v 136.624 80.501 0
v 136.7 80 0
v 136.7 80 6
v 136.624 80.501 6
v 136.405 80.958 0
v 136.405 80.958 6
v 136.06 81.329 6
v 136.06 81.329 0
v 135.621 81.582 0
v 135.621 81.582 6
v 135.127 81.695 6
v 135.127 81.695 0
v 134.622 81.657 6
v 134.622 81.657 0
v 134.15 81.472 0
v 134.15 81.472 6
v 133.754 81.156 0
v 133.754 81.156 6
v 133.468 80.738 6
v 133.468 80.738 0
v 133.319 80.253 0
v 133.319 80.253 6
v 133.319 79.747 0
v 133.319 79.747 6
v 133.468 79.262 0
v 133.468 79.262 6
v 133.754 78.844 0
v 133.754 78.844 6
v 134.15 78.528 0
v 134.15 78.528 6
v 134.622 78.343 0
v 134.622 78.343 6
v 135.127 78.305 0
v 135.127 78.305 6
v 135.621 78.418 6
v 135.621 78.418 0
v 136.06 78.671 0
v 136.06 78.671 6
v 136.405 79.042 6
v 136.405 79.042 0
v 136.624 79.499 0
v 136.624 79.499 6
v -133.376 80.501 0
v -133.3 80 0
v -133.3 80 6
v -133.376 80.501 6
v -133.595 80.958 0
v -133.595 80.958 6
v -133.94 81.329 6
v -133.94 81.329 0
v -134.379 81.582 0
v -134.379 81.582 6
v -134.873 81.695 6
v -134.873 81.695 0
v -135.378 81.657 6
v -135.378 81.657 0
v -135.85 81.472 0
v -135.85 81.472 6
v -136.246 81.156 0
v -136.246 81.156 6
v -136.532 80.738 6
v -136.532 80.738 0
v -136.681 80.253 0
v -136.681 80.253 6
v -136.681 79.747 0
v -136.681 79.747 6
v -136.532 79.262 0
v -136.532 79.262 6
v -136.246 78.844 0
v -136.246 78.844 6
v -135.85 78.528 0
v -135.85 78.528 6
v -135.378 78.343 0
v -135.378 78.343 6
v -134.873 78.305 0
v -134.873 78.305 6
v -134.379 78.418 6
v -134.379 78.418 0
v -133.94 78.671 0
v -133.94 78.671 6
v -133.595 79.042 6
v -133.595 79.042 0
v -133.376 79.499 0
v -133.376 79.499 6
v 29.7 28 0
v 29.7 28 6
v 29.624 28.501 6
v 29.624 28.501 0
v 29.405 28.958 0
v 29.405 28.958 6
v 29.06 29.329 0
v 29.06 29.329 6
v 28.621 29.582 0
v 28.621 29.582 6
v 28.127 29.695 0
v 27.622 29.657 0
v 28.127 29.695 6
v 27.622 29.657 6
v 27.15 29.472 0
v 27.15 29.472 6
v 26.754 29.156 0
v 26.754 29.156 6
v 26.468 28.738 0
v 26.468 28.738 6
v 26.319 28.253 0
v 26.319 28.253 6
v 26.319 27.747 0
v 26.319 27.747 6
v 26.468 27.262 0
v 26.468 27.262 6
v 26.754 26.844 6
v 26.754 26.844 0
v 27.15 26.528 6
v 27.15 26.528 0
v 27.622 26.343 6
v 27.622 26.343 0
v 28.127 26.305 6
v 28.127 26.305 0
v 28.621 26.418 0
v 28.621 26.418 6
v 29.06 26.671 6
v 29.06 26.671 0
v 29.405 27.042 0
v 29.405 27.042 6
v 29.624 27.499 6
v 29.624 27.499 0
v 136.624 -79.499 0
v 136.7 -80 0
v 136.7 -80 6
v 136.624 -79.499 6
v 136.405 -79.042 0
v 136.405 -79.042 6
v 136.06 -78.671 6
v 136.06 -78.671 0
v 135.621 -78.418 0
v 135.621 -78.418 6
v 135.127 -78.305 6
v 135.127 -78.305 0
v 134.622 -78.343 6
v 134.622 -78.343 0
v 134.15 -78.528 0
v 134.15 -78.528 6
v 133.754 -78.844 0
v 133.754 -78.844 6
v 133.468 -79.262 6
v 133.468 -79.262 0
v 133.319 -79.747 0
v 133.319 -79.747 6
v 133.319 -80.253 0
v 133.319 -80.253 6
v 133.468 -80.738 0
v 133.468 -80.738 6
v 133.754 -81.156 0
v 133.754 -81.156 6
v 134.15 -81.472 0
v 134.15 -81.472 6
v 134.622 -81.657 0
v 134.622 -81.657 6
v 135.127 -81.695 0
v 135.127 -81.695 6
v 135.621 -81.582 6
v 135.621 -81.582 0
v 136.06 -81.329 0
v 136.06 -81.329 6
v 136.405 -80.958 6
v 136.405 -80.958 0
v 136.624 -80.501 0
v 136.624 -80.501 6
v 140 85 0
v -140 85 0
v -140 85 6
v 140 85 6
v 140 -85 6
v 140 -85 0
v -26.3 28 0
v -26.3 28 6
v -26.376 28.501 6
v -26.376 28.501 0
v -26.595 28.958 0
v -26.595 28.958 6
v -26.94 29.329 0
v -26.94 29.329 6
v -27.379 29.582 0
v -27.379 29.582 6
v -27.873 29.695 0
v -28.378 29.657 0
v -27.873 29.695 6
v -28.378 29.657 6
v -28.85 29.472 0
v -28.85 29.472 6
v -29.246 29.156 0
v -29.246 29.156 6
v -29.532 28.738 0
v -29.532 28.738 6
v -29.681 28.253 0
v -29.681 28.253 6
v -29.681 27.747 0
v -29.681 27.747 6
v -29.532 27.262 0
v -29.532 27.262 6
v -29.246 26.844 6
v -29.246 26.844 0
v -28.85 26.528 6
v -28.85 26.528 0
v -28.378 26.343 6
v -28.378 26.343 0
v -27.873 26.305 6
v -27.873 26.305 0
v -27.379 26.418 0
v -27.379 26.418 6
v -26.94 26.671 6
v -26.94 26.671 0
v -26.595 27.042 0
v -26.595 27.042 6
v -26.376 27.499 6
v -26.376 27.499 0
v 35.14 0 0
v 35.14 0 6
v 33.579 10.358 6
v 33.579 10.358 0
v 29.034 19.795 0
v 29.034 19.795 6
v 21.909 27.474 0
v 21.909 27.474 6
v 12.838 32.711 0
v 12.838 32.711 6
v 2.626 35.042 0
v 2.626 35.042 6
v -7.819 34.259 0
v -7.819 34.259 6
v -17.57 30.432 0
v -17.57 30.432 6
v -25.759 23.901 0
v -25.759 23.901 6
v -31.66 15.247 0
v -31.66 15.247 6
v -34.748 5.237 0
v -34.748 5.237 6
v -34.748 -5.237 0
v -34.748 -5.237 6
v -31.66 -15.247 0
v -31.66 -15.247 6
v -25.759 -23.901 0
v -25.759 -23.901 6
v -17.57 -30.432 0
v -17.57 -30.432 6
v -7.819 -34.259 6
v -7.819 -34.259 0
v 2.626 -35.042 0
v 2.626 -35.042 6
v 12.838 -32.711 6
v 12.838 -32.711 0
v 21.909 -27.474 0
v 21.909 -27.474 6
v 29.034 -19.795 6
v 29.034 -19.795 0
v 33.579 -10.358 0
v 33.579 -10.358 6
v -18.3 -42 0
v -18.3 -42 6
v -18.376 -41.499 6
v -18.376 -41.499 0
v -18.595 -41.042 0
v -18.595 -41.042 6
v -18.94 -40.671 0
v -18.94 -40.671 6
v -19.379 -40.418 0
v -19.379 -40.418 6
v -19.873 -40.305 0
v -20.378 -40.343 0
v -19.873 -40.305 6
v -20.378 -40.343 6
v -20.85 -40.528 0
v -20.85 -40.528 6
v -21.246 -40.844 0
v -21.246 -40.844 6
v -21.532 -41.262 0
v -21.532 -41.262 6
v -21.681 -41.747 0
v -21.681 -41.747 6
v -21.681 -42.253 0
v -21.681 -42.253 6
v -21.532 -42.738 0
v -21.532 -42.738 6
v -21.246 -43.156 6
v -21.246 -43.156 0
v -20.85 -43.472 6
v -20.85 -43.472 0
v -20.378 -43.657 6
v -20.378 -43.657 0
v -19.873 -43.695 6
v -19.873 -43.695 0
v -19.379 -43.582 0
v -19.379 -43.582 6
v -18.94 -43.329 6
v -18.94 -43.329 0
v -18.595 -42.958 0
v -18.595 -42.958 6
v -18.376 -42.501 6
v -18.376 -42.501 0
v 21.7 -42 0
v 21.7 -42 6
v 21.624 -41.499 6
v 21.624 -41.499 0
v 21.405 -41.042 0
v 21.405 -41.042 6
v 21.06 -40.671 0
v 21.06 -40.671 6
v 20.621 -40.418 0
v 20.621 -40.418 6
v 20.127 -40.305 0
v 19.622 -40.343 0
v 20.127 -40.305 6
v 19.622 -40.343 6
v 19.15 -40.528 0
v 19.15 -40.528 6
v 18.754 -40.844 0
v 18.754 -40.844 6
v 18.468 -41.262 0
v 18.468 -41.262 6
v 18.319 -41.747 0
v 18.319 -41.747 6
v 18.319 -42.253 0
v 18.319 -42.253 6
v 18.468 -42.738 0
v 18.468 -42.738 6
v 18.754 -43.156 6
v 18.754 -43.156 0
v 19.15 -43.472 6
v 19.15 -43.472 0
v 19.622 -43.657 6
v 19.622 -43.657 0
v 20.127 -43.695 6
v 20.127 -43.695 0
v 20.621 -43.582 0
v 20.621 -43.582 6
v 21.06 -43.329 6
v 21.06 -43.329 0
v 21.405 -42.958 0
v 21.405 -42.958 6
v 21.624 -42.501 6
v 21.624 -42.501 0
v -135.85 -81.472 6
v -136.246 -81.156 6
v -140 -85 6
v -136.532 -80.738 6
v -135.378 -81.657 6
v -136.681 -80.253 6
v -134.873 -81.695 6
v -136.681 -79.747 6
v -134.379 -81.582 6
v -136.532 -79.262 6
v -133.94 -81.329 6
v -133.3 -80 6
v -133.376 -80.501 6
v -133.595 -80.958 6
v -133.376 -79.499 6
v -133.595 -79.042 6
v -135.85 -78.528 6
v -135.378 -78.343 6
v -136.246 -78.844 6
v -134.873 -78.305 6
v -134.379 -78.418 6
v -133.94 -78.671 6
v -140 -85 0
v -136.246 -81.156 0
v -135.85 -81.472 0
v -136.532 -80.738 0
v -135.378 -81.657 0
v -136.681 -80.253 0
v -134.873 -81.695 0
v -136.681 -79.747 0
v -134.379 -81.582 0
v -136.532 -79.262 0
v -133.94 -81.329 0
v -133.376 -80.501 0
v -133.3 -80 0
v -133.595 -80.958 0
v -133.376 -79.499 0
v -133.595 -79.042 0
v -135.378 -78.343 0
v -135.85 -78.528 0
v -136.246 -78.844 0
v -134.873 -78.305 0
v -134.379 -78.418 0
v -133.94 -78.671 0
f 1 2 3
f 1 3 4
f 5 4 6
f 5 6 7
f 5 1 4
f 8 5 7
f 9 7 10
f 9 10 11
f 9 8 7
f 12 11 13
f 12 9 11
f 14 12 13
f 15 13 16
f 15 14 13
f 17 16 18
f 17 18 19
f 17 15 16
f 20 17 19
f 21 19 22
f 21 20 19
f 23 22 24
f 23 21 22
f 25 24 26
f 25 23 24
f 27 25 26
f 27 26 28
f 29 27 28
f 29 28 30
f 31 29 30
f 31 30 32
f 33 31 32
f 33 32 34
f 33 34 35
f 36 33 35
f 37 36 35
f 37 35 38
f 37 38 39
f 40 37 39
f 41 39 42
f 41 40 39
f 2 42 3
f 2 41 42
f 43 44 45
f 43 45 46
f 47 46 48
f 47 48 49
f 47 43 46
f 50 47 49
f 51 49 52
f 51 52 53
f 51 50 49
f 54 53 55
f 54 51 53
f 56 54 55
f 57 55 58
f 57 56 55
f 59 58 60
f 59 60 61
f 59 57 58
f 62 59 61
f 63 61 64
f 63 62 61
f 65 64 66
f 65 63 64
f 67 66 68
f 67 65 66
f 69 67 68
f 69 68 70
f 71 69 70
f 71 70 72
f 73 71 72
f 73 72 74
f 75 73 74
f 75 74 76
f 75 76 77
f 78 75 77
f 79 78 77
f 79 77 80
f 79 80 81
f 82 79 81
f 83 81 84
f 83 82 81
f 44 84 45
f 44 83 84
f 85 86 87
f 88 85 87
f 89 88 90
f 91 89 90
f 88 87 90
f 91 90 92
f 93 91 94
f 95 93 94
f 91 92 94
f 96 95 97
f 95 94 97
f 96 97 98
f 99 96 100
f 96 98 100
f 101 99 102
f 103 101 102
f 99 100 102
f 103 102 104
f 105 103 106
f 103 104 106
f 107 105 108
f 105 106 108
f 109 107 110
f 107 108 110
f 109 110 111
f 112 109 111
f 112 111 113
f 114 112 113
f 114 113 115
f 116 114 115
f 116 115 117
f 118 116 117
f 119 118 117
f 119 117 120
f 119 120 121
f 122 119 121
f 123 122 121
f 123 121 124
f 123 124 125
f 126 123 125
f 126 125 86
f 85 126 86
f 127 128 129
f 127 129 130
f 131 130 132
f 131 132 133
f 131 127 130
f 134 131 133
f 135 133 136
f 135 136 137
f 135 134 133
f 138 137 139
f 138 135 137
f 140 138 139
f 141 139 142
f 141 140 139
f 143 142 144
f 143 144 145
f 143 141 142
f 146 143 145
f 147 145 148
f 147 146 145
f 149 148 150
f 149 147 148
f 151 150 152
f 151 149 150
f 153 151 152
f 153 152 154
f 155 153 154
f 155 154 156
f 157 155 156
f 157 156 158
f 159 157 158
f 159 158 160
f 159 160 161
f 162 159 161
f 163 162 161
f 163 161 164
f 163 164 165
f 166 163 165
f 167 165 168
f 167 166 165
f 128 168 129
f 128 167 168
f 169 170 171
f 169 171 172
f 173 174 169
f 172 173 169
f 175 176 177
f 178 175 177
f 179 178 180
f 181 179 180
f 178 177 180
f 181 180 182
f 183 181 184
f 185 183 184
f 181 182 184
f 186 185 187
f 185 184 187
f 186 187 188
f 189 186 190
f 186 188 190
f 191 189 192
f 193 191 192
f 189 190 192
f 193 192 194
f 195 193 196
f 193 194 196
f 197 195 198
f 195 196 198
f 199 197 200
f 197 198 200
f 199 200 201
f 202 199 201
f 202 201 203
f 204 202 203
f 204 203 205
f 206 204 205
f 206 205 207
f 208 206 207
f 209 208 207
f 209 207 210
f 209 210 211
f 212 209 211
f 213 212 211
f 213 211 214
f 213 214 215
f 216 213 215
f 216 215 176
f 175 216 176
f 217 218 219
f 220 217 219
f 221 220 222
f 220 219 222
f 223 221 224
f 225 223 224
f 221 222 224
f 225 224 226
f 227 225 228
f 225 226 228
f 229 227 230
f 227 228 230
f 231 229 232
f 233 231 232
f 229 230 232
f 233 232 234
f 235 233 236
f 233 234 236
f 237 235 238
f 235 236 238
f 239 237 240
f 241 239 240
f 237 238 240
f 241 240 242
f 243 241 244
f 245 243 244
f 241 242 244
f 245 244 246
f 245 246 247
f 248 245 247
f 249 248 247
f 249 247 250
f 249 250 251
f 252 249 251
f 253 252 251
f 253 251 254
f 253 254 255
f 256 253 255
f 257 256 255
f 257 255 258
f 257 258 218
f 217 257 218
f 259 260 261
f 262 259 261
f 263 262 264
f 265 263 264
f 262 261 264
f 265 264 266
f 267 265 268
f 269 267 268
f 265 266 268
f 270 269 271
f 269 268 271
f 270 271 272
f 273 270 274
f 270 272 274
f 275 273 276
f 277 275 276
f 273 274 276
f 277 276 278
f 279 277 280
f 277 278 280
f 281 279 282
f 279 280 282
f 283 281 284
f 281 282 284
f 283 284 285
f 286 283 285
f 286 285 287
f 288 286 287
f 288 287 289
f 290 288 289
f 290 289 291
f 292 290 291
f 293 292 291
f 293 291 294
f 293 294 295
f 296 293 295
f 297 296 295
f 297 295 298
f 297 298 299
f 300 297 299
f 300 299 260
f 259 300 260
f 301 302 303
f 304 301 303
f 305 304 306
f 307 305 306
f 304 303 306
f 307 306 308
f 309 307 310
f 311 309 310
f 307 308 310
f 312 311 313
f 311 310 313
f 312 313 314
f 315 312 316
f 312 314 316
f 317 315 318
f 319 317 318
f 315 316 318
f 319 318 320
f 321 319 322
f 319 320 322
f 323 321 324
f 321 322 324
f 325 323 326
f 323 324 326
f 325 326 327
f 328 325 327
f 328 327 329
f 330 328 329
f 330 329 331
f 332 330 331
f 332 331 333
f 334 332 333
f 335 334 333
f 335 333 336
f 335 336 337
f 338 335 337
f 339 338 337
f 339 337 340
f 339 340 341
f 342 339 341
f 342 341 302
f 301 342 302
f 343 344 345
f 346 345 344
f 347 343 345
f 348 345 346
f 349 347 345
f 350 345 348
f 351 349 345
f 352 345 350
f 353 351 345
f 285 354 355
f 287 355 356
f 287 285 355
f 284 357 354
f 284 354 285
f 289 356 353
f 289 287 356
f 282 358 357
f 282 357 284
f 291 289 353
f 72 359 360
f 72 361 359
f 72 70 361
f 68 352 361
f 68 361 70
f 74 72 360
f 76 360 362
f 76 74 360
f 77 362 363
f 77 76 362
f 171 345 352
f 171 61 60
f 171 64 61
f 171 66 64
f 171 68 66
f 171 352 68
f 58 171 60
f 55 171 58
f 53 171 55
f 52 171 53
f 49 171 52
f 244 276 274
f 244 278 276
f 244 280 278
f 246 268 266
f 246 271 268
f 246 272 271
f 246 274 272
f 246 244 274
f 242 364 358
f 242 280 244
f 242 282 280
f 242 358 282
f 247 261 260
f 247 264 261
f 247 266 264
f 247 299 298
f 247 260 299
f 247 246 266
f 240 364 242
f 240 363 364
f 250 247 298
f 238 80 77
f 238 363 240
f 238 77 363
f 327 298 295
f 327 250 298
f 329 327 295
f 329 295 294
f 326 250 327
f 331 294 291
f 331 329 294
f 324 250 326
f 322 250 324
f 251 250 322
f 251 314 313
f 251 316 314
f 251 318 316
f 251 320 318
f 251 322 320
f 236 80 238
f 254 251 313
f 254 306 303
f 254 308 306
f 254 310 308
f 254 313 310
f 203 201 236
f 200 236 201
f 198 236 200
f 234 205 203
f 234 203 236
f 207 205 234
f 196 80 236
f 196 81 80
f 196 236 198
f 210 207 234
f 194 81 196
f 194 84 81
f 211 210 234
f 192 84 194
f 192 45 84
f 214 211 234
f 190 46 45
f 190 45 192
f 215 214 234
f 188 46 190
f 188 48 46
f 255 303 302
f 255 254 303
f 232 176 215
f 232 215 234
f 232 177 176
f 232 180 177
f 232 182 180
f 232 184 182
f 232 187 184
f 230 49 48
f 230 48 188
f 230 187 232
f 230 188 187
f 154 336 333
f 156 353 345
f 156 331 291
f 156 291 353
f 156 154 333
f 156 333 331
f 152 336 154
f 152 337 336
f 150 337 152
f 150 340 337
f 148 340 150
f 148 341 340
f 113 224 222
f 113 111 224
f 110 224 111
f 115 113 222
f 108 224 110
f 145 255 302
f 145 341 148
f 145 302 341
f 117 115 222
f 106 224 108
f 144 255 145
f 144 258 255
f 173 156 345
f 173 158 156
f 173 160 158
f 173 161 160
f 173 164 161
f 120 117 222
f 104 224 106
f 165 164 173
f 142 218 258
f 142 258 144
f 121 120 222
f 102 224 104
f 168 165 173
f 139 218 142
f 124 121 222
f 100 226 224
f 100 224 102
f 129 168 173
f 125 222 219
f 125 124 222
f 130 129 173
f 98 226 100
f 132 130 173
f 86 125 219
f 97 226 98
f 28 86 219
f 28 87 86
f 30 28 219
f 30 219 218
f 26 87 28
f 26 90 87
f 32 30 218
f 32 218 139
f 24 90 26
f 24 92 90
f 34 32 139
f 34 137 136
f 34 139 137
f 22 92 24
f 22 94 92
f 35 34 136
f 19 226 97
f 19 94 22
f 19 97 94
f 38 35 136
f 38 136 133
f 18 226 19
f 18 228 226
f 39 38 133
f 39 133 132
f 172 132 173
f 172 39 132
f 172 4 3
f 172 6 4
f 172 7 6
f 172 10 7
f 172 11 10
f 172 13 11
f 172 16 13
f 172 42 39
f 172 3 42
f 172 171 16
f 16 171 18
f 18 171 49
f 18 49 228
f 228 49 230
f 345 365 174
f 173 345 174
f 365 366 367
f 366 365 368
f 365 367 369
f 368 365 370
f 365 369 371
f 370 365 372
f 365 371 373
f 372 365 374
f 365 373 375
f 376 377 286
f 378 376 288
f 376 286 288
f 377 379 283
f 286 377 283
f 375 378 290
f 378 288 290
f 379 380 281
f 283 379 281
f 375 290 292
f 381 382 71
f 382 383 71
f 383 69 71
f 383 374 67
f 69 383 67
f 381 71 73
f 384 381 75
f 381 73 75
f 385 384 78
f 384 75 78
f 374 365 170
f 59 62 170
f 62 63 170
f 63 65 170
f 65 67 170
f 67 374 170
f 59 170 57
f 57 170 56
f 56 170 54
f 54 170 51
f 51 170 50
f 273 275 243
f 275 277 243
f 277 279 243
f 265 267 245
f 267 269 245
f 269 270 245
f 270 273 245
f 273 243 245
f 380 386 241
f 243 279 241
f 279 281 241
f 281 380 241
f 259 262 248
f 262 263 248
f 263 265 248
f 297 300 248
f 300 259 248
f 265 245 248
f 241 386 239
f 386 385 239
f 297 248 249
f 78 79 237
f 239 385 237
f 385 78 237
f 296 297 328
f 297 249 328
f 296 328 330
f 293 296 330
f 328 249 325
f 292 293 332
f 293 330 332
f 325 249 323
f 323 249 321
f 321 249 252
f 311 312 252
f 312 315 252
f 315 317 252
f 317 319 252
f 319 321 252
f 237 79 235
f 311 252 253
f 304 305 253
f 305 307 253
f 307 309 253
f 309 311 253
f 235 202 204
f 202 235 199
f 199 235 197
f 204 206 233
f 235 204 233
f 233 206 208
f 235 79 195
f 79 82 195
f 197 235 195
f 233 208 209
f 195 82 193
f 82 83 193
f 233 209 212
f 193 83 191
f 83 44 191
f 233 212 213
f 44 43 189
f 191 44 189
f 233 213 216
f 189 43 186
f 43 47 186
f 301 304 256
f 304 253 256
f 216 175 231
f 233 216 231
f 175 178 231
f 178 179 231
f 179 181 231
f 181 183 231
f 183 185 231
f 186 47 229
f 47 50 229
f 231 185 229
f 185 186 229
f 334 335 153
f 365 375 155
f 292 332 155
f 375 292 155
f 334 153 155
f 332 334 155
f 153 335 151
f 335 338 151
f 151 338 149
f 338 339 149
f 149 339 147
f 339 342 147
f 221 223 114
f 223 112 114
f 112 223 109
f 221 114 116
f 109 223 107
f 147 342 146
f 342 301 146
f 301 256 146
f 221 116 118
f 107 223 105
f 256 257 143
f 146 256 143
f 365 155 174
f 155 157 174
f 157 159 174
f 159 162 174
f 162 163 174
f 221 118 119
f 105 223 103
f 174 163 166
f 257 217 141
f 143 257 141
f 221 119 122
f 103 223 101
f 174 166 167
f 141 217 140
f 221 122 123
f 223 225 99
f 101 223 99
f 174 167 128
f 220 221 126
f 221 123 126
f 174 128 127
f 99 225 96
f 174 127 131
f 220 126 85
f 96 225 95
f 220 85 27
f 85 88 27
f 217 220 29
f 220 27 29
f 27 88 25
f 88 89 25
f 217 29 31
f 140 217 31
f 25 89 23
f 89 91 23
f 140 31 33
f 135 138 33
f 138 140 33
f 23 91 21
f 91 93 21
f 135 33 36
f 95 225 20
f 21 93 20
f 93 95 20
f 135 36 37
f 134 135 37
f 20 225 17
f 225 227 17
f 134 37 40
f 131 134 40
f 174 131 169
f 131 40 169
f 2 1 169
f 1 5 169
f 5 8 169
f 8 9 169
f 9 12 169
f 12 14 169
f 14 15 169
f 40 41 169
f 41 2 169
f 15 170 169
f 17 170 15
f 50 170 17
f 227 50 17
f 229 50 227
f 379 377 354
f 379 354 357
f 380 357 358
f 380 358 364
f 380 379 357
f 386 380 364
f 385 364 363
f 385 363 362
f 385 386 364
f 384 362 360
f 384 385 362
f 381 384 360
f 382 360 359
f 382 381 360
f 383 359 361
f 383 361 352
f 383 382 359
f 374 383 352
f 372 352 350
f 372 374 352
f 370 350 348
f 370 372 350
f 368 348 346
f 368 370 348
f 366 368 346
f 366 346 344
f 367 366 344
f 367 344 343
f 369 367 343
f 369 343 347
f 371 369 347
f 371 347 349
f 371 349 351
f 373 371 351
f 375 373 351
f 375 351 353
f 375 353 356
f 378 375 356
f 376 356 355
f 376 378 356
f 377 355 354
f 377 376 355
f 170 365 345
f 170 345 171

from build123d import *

# Parameters (mm, degrees)
SKETCH_W      = 280
SKETCH_H      = 170
SKETCH_R      = 1.7
PAD_DEPTH     = 6
SKETCH002_R   = 35.14
SKETCH002_R_2 = 1.7
POCKET_DEPTH  = 6.001


with BuildPart() as part:
    # Sketch → Pad (new body)
    with BuildSketch(Plane.XY):
        Rectangle(SKETCH_W, SKETCH_H)
        with Locations((-135, 80)):
            Circle(SKETCH_R, mode=Mode.SUBTRACT)
        with Locations((-135, -80)):
            Circle(SKETCH_R, mode=Mode.SUBTRACT)
        with Locations((135, 80)):
            Circle(SKETCH_R, mode=Mode.SUBTRACT)
        with Locations((135, -80)):
            Circle(SKETCH_R, mode=Mode.SUBTRACT)
    extrude(amount=PAD_DEPTH)

    # Sketch002 (on Face10 of Pad) → Pocket (cut, through all)
    with BuildSketch(Plane.XY.offset(6)):
        Circle(SKETCH002_R)
        with Locations((-28, 28)):
            Circle(SKETCH002_R_2)
        with Locations((28, 28)):
            Circle(SKETCH002_R_2)
        with Locations((-20, -42)):
            Circle(SKETCH002_R_2)
        with Locations((20, -42)):
            Circle(SKETCH002_R_2)
    extrude(amount=-POCKET_DEPTH, mode=Mode.SUBTRACT)


solid = part.part
